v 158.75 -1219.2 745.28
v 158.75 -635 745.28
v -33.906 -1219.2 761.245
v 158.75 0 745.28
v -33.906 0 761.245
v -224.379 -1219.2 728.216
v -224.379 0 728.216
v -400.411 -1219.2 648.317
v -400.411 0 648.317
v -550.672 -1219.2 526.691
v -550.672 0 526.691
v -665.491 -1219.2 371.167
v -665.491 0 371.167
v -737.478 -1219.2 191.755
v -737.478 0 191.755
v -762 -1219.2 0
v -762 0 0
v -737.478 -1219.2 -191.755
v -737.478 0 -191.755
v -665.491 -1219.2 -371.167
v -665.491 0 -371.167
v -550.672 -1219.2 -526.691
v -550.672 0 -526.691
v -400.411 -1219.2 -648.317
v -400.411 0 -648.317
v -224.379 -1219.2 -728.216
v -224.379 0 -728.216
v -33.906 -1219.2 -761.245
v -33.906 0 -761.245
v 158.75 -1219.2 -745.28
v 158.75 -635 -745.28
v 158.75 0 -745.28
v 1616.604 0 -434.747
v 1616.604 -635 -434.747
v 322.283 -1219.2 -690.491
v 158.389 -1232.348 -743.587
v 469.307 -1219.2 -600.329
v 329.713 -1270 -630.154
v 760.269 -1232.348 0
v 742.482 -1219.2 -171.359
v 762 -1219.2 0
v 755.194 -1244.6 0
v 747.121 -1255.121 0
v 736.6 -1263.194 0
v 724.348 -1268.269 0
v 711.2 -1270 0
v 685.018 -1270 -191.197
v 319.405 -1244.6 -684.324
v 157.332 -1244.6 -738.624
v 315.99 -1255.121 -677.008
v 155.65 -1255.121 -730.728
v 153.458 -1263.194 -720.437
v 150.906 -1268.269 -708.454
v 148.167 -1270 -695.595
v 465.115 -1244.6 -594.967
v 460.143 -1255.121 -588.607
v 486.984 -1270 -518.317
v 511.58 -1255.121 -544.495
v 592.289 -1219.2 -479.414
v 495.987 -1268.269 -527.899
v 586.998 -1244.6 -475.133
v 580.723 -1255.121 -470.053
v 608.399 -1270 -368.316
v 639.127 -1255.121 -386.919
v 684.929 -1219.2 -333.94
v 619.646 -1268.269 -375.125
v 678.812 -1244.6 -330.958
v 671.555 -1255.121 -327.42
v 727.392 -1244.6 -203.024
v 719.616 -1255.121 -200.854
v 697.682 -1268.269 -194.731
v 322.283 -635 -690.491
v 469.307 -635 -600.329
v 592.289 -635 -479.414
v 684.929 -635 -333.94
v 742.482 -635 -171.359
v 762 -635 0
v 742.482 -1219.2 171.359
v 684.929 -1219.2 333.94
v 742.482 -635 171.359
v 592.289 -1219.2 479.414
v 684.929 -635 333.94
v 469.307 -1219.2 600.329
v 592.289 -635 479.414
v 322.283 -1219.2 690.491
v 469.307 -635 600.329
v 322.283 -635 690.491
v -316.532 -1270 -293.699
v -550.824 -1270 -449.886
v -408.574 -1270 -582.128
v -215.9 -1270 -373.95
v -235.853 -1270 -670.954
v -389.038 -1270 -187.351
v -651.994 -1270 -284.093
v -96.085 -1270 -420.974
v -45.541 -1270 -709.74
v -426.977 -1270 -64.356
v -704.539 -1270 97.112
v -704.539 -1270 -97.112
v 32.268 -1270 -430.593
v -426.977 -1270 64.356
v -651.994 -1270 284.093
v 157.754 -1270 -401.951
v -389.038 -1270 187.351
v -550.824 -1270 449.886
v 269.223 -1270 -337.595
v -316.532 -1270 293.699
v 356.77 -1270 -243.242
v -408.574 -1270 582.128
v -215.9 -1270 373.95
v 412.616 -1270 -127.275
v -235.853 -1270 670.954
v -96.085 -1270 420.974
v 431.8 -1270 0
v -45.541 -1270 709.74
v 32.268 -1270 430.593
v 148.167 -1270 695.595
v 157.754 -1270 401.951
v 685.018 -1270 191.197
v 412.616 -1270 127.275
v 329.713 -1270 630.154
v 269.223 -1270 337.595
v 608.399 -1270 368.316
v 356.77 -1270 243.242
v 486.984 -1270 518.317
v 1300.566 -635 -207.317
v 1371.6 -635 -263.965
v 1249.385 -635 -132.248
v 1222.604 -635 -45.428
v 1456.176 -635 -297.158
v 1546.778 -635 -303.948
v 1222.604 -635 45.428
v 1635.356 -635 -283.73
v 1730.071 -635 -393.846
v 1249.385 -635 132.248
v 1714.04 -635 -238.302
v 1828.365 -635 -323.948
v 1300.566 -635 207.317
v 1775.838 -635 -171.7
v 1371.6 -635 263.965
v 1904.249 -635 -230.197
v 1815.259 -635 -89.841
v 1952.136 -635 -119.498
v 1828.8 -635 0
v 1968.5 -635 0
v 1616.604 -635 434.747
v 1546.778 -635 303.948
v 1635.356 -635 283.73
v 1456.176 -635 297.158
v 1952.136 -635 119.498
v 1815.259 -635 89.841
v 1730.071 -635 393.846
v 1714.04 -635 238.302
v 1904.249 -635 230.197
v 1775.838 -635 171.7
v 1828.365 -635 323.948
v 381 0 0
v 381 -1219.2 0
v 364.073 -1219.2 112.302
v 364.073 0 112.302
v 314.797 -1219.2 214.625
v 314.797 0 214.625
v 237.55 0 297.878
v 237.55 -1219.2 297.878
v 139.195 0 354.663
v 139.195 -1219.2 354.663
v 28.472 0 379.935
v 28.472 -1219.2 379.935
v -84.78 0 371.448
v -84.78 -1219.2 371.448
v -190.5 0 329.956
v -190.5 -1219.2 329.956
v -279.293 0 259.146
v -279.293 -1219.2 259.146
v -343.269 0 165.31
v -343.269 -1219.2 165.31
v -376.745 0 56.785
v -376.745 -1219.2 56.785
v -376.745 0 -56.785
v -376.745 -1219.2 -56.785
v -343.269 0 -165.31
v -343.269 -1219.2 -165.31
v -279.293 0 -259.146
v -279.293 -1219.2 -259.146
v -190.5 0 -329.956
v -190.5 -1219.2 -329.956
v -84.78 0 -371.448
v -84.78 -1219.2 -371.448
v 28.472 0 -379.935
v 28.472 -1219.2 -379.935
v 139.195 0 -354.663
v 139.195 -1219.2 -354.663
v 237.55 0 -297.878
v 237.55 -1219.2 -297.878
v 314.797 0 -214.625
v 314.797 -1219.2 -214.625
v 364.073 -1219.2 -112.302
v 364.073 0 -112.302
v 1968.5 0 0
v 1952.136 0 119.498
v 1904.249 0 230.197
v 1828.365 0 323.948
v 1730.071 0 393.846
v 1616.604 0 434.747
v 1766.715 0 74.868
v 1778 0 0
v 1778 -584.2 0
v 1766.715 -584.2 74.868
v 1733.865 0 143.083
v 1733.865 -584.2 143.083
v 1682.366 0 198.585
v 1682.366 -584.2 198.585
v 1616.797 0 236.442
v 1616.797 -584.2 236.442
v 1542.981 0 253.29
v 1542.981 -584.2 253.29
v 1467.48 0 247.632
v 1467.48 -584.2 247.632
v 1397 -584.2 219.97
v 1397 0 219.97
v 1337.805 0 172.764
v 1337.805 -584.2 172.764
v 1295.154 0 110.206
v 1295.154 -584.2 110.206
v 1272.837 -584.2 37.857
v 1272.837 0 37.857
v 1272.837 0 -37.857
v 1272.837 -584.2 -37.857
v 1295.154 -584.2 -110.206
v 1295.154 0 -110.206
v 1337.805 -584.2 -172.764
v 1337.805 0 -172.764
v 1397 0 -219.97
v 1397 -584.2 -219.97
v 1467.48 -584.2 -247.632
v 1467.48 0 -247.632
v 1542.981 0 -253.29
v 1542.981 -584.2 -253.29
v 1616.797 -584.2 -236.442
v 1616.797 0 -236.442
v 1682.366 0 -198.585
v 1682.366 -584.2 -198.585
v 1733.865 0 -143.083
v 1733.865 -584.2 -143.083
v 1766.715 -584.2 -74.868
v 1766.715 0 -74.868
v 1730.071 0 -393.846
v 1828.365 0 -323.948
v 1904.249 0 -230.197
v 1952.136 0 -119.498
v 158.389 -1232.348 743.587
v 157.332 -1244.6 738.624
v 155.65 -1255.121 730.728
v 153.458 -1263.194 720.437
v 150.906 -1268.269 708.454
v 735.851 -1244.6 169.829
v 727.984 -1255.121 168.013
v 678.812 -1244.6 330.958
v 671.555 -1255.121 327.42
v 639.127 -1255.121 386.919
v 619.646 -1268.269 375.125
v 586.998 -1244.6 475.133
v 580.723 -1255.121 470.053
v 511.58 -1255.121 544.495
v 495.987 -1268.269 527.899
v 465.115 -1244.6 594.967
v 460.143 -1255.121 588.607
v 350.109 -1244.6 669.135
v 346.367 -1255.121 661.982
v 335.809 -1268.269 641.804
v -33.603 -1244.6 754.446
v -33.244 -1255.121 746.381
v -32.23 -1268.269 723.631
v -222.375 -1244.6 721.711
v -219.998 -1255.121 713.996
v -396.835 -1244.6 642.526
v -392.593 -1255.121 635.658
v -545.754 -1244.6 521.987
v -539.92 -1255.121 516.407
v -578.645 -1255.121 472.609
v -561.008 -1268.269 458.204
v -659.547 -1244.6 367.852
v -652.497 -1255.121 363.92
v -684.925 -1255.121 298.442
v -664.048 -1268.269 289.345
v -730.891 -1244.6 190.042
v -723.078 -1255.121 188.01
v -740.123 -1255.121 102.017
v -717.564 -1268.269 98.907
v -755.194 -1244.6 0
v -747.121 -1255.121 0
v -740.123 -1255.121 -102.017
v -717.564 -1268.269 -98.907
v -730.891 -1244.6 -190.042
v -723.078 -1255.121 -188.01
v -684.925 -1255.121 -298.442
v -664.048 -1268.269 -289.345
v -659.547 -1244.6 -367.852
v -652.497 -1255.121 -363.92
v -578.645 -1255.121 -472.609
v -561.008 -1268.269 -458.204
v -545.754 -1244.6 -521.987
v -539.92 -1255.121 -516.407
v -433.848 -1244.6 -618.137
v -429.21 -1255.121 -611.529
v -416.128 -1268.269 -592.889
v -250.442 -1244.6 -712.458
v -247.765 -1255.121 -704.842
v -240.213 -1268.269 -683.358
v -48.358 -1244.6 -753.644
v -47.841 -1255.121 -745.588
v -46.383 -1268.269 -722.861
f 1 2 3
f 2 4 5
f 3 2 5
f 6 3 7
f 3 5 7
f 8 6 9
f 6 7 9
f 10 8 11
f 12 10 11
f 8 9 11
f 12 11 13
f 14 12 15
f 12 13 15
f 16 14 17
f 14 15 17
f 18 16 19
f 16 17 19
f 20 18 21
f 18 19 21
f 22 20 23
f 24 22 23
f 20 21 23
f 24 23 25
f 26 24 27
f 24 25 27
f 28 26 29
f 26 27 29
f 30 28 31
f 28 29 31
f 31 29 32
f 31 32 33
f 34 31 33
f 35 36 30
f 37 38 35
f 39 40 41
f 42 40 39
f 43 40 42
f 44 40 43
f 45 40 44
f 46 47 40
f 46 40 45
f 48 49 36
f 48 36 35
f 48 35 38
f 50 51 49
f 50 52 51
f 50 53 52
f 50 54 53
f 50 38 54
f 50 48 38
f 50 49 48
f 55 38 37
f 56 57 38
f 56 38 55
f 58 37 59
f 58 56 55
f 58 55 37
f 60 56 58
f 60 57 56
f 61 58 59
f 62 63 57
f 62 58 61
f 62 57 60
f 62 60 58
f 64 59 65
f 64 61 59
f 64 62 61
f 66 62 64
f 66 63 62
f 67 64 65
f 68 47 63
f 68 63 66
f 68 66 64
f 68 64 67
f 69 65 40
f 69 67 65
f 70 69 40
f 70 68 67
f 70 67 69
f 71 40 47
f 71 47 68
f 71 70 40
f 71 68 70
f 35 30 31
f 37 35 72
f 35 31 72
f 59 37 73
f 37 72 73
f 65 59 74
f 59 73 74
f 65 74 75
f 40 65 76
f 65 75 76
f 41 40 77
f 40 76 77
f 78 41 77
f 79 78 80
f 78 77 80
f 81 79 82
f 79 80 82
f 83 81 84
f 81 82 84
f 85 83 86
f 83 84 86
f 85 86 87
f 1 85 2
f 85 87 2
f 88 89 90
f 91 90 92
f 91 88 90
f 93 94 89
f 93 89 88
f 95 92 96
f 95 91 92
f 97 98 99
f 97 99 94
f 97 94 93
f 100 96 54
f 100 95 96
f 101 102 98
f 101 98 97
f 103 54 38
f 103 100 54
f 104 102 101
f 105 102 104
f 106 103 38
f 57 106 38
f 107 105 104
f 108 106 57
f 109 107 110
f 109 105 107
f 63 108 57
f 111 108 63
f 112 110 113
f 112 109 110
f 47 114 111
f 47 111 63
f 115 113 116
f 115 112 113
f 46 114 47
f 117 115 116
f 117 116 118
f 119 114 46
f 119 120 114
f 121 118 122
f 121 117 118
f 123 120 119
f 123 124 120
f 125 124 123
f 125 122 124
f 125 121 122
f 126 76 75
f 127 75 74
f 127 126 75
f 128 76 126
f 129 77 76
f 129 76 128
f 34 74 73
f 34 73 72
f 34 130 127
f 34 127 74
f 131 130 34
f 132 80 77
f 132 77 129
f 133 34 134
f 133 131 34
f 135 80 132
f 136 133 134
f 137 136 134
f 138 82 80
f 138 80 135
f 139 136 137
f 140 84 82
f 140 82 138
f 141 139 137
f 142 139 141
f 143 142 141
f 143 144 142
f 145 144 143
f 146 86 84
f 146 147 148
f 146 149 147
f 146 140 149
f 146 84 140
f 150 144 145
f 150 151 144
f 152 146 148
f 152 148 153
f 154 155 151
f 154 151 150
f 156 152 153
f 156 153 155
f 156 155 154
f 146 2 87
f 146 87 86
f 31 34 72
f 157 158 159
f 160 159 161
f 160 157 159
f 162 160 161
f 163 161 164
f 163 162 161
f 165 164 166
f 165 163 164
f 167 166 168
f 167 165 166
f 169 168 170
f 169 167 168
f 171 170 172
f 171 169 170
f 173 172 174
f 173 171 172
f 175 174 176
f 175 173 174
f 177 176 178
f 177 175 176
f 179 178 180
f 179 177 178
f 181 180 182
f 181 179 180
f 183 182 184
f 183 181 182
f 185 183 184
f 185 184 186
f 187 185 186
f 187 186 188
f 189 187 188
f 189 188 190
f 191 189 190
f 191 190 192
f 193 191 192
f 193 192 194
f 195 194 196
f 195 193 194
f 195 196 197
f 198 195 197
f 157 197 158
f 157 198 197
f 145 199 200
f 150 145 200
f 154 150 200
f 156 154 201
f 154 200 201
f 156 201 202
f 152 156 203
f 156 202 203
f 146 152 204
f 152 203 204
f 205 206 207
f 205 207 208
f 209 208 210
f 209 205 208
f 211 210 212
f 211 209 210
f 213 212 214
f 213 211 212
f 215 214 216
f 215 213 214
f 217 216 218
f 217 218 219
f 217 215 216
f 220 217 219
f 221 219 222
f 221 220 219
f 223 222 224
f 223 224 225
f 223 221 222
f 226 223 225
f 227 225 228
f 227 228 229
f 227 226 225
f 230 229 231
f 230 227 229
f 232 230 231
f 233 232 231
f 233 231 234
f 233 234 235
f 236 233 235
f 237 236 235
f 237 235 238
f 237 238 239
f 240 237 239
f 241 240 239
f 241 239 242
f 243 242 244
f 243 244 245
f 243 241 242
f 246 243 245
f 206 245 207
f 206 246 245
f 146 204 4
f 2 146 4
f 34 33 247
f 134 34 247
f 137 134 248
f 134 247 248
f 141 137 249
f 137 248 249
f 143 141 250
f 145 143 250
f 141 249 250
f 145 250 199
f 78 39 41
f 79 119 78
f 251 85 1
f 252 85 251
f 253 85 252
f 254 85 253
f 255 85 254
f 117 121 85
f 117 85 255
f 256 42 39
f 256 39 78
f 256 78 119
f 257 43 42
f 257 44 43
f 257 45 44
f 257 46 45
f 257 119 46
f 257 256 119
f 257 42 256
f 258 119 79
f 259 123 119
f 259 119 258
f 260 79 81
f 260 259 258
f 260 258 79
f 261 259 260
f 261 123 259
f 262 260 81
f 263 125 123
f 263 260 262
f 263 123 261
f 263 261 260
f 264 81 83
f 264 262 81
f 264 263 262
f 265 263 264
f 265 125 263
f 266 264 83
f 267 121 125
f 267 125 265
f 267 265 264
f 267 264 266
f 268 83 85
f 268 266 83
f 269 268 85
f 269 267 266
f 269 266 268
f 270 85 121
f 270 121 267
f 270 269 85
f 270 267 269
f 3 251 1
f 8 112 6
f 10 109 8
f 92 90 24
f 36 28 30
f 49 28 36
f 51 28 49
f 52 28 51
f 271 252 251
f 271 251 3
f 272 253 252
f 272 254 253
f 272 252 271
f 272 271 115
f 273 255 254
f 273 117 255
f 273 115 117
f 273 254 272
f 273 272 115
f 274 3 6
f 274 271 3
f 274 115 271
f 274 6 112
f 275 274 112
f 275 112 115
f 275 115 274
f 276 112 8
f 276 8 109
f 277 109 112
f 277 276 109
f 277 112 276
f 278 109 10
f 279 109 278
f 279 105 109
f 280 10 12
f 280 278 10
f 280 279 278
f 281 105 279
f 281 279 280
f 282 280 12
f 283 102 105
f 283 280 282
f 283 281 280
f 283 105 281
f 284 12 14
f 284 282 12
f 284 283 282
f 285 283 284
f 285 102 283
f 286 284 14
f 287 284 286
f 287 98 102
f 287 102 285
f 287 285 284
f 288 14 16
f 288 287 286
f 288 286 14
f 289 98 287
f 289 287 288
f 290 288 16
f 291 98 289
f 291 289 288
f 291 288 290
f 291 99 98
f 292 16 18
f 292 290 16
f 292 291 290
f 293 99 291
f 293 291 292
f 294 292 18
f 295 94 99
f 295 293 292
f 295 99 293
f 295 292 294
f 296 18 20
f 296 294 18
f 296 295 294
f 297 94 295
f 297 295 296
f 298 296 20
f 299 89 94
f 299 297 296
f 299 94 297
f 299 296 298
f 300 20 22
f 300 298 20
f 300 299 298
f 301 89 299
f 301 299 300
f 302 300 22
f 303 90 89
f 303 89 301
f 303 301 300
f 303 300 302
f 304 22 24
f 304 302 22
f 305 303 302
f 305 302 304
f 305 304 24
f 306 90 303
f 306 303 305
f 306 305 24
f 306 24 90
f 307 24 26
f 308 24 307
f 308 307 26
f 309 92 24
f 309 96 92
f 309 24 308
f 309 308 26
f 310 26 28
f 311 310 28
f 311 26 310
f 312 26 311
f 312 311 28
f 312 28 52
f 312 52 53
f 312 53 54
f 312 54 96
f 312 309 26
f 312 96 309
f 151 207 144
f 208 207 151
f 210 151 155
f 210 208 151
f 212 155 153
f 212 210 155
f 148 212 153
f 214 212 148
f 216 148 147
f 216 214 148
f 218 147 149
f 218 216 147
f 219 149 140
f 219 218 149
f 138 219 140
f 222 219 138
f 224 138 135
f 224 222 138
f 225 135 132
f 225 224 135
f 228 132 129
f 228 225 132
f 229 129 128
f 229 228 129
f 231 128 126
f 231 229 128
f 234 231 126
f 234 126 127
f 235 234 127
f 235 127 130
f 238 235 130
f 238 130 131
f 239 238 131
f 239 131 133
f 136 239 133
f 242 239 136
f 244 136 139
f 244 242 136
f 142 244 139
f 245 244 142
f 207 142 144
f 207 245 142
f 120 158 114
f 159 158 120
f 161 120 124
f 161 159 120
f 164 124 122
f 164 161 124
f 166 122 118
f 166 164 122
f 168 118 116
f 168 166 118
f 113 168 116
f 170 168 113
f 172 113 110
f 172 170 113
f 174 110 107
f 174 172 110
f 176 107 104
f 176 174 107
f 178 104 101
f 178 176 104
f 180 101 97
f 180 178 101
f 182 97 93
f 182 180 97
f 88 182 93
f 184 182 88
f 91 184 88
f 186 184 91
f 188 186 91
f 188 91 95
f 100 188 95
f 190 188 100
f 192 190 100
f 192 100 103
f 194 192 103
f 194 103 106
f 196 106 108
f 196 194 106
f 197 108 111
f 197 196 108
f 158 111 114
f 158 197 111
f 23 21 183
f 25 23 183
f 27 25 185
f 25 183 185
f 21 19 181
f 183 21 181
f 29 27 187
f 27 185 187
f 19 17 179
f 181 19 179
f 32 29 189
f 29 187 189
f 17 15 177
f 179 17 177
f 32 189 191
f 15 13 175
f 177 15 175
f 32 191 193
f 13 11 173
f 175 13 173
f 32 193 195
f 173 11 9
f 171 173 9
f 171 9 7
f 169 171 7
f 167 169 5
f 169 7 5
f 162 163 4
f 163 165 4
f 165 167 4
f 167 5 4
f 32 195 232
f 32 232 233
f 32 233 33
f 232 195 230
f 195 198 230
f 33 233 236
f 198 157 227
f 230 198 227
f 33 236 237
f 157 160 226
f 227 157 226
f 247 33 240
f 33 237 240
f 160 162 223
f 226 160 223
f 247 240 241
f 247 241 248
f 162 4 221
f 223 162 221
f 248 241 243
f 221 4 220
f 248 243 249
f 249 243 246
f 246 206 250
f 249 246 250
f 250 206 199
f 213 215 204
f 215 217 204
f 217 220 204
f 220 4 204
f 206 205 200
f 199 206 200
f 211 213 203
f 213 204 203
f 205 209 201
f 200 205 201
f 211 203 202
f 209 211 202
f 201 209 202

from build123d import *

# Parameters (mm, degrees)
F0_R     = 381
F0_R_2   = 254
F1_DEPTH = 635
F2_DEPTH = 1270
F3_R     = 50.8
F4_SIZE  = 50.8


with BuildPart() as f1:
    # F0 (on Front) → F1 (new body)
    with BuildSketch(Plane.XZ):
        with BuildLine():
            ThreePointArc((158.75, -745.280107), (592.28857, -479.414487), (762, 0))
            ThreePointArc((762, 0), (592.28857, 479.414487), (158.75, 745.280107))
            ThreePointArc((158.75, 745.280107), (-762, 0), (158.75, -745.280107))
        make_face()
        Circle(F0_R, mode=Mode.SUBTRACT)
        with BuildLine():
            ThreePointArc((158.75, 745.280107), (592.28857, 479.414487), (762, 0))
            ThreePointArc((762, 0), (592.28857, -479.414487), (158.75, -745.280107))
            Line((158.75, -745.280107), (1616.604167, -434.746729))
            ThreePointArc((1616.604167, -434.746729), (1079.5, 0), (1616.604167, 434.746729))
            Line((1616.604167, 434.746729), (158.75, 745.280107))
        make_face()
        with BuildLine():
            ThreePointArc((1968.5, 0), (1869.501666, 279.658451), (1616.604167, 434.746729))
            ThreePointArc((1616.604167, 434.746729), (1079.5, 0), (1616.604167, -434.746729))
            ThreePointArc((1616.604167, -434.746729), (1869.501666, -279.658451), (1968.5, 0))
        make_face()
        with Locations((1524, 0)):
            Circle(F0_R_2, mode=Mode.SUBTRACT)
    extrude(amount=F1_DEPTH)

    # F0 (on Front) → F2 (join)
    with BuildSketch(Plane.XZ):
        with BuildLine():
            ThreePointArc((158.75, -745.280107), (592.28857, -479.414487), (762, 0))
            ThreePointArc((762, 0), (592.28857, 479.414487), (158.75, 745.280107))
            ThreePointArc((158.75, 745.280107), (-762, 0), (158.75, -745.280107))
        make_face()
        Circle(F0_R, mode=Mode.SUBTRACT)
    extrude(amount=F2_DEPTH)

    # F3
    f3_edges = [f1.edges().sort_by_distance(p)[0] for p in [
        (-158.75, -1270, 745.280107),
    ]]
    fillet(f3_edges, radius=F3_R)

    # F4
    f4_edges = [f1.edges().sort_by_distance(p)[0] for p in [
        (-381, -1270, 0),
        (1270, -635, 0),
    ]]
    chamfer(f4_edges, length=F4_SIZE)


solid = f1.part
